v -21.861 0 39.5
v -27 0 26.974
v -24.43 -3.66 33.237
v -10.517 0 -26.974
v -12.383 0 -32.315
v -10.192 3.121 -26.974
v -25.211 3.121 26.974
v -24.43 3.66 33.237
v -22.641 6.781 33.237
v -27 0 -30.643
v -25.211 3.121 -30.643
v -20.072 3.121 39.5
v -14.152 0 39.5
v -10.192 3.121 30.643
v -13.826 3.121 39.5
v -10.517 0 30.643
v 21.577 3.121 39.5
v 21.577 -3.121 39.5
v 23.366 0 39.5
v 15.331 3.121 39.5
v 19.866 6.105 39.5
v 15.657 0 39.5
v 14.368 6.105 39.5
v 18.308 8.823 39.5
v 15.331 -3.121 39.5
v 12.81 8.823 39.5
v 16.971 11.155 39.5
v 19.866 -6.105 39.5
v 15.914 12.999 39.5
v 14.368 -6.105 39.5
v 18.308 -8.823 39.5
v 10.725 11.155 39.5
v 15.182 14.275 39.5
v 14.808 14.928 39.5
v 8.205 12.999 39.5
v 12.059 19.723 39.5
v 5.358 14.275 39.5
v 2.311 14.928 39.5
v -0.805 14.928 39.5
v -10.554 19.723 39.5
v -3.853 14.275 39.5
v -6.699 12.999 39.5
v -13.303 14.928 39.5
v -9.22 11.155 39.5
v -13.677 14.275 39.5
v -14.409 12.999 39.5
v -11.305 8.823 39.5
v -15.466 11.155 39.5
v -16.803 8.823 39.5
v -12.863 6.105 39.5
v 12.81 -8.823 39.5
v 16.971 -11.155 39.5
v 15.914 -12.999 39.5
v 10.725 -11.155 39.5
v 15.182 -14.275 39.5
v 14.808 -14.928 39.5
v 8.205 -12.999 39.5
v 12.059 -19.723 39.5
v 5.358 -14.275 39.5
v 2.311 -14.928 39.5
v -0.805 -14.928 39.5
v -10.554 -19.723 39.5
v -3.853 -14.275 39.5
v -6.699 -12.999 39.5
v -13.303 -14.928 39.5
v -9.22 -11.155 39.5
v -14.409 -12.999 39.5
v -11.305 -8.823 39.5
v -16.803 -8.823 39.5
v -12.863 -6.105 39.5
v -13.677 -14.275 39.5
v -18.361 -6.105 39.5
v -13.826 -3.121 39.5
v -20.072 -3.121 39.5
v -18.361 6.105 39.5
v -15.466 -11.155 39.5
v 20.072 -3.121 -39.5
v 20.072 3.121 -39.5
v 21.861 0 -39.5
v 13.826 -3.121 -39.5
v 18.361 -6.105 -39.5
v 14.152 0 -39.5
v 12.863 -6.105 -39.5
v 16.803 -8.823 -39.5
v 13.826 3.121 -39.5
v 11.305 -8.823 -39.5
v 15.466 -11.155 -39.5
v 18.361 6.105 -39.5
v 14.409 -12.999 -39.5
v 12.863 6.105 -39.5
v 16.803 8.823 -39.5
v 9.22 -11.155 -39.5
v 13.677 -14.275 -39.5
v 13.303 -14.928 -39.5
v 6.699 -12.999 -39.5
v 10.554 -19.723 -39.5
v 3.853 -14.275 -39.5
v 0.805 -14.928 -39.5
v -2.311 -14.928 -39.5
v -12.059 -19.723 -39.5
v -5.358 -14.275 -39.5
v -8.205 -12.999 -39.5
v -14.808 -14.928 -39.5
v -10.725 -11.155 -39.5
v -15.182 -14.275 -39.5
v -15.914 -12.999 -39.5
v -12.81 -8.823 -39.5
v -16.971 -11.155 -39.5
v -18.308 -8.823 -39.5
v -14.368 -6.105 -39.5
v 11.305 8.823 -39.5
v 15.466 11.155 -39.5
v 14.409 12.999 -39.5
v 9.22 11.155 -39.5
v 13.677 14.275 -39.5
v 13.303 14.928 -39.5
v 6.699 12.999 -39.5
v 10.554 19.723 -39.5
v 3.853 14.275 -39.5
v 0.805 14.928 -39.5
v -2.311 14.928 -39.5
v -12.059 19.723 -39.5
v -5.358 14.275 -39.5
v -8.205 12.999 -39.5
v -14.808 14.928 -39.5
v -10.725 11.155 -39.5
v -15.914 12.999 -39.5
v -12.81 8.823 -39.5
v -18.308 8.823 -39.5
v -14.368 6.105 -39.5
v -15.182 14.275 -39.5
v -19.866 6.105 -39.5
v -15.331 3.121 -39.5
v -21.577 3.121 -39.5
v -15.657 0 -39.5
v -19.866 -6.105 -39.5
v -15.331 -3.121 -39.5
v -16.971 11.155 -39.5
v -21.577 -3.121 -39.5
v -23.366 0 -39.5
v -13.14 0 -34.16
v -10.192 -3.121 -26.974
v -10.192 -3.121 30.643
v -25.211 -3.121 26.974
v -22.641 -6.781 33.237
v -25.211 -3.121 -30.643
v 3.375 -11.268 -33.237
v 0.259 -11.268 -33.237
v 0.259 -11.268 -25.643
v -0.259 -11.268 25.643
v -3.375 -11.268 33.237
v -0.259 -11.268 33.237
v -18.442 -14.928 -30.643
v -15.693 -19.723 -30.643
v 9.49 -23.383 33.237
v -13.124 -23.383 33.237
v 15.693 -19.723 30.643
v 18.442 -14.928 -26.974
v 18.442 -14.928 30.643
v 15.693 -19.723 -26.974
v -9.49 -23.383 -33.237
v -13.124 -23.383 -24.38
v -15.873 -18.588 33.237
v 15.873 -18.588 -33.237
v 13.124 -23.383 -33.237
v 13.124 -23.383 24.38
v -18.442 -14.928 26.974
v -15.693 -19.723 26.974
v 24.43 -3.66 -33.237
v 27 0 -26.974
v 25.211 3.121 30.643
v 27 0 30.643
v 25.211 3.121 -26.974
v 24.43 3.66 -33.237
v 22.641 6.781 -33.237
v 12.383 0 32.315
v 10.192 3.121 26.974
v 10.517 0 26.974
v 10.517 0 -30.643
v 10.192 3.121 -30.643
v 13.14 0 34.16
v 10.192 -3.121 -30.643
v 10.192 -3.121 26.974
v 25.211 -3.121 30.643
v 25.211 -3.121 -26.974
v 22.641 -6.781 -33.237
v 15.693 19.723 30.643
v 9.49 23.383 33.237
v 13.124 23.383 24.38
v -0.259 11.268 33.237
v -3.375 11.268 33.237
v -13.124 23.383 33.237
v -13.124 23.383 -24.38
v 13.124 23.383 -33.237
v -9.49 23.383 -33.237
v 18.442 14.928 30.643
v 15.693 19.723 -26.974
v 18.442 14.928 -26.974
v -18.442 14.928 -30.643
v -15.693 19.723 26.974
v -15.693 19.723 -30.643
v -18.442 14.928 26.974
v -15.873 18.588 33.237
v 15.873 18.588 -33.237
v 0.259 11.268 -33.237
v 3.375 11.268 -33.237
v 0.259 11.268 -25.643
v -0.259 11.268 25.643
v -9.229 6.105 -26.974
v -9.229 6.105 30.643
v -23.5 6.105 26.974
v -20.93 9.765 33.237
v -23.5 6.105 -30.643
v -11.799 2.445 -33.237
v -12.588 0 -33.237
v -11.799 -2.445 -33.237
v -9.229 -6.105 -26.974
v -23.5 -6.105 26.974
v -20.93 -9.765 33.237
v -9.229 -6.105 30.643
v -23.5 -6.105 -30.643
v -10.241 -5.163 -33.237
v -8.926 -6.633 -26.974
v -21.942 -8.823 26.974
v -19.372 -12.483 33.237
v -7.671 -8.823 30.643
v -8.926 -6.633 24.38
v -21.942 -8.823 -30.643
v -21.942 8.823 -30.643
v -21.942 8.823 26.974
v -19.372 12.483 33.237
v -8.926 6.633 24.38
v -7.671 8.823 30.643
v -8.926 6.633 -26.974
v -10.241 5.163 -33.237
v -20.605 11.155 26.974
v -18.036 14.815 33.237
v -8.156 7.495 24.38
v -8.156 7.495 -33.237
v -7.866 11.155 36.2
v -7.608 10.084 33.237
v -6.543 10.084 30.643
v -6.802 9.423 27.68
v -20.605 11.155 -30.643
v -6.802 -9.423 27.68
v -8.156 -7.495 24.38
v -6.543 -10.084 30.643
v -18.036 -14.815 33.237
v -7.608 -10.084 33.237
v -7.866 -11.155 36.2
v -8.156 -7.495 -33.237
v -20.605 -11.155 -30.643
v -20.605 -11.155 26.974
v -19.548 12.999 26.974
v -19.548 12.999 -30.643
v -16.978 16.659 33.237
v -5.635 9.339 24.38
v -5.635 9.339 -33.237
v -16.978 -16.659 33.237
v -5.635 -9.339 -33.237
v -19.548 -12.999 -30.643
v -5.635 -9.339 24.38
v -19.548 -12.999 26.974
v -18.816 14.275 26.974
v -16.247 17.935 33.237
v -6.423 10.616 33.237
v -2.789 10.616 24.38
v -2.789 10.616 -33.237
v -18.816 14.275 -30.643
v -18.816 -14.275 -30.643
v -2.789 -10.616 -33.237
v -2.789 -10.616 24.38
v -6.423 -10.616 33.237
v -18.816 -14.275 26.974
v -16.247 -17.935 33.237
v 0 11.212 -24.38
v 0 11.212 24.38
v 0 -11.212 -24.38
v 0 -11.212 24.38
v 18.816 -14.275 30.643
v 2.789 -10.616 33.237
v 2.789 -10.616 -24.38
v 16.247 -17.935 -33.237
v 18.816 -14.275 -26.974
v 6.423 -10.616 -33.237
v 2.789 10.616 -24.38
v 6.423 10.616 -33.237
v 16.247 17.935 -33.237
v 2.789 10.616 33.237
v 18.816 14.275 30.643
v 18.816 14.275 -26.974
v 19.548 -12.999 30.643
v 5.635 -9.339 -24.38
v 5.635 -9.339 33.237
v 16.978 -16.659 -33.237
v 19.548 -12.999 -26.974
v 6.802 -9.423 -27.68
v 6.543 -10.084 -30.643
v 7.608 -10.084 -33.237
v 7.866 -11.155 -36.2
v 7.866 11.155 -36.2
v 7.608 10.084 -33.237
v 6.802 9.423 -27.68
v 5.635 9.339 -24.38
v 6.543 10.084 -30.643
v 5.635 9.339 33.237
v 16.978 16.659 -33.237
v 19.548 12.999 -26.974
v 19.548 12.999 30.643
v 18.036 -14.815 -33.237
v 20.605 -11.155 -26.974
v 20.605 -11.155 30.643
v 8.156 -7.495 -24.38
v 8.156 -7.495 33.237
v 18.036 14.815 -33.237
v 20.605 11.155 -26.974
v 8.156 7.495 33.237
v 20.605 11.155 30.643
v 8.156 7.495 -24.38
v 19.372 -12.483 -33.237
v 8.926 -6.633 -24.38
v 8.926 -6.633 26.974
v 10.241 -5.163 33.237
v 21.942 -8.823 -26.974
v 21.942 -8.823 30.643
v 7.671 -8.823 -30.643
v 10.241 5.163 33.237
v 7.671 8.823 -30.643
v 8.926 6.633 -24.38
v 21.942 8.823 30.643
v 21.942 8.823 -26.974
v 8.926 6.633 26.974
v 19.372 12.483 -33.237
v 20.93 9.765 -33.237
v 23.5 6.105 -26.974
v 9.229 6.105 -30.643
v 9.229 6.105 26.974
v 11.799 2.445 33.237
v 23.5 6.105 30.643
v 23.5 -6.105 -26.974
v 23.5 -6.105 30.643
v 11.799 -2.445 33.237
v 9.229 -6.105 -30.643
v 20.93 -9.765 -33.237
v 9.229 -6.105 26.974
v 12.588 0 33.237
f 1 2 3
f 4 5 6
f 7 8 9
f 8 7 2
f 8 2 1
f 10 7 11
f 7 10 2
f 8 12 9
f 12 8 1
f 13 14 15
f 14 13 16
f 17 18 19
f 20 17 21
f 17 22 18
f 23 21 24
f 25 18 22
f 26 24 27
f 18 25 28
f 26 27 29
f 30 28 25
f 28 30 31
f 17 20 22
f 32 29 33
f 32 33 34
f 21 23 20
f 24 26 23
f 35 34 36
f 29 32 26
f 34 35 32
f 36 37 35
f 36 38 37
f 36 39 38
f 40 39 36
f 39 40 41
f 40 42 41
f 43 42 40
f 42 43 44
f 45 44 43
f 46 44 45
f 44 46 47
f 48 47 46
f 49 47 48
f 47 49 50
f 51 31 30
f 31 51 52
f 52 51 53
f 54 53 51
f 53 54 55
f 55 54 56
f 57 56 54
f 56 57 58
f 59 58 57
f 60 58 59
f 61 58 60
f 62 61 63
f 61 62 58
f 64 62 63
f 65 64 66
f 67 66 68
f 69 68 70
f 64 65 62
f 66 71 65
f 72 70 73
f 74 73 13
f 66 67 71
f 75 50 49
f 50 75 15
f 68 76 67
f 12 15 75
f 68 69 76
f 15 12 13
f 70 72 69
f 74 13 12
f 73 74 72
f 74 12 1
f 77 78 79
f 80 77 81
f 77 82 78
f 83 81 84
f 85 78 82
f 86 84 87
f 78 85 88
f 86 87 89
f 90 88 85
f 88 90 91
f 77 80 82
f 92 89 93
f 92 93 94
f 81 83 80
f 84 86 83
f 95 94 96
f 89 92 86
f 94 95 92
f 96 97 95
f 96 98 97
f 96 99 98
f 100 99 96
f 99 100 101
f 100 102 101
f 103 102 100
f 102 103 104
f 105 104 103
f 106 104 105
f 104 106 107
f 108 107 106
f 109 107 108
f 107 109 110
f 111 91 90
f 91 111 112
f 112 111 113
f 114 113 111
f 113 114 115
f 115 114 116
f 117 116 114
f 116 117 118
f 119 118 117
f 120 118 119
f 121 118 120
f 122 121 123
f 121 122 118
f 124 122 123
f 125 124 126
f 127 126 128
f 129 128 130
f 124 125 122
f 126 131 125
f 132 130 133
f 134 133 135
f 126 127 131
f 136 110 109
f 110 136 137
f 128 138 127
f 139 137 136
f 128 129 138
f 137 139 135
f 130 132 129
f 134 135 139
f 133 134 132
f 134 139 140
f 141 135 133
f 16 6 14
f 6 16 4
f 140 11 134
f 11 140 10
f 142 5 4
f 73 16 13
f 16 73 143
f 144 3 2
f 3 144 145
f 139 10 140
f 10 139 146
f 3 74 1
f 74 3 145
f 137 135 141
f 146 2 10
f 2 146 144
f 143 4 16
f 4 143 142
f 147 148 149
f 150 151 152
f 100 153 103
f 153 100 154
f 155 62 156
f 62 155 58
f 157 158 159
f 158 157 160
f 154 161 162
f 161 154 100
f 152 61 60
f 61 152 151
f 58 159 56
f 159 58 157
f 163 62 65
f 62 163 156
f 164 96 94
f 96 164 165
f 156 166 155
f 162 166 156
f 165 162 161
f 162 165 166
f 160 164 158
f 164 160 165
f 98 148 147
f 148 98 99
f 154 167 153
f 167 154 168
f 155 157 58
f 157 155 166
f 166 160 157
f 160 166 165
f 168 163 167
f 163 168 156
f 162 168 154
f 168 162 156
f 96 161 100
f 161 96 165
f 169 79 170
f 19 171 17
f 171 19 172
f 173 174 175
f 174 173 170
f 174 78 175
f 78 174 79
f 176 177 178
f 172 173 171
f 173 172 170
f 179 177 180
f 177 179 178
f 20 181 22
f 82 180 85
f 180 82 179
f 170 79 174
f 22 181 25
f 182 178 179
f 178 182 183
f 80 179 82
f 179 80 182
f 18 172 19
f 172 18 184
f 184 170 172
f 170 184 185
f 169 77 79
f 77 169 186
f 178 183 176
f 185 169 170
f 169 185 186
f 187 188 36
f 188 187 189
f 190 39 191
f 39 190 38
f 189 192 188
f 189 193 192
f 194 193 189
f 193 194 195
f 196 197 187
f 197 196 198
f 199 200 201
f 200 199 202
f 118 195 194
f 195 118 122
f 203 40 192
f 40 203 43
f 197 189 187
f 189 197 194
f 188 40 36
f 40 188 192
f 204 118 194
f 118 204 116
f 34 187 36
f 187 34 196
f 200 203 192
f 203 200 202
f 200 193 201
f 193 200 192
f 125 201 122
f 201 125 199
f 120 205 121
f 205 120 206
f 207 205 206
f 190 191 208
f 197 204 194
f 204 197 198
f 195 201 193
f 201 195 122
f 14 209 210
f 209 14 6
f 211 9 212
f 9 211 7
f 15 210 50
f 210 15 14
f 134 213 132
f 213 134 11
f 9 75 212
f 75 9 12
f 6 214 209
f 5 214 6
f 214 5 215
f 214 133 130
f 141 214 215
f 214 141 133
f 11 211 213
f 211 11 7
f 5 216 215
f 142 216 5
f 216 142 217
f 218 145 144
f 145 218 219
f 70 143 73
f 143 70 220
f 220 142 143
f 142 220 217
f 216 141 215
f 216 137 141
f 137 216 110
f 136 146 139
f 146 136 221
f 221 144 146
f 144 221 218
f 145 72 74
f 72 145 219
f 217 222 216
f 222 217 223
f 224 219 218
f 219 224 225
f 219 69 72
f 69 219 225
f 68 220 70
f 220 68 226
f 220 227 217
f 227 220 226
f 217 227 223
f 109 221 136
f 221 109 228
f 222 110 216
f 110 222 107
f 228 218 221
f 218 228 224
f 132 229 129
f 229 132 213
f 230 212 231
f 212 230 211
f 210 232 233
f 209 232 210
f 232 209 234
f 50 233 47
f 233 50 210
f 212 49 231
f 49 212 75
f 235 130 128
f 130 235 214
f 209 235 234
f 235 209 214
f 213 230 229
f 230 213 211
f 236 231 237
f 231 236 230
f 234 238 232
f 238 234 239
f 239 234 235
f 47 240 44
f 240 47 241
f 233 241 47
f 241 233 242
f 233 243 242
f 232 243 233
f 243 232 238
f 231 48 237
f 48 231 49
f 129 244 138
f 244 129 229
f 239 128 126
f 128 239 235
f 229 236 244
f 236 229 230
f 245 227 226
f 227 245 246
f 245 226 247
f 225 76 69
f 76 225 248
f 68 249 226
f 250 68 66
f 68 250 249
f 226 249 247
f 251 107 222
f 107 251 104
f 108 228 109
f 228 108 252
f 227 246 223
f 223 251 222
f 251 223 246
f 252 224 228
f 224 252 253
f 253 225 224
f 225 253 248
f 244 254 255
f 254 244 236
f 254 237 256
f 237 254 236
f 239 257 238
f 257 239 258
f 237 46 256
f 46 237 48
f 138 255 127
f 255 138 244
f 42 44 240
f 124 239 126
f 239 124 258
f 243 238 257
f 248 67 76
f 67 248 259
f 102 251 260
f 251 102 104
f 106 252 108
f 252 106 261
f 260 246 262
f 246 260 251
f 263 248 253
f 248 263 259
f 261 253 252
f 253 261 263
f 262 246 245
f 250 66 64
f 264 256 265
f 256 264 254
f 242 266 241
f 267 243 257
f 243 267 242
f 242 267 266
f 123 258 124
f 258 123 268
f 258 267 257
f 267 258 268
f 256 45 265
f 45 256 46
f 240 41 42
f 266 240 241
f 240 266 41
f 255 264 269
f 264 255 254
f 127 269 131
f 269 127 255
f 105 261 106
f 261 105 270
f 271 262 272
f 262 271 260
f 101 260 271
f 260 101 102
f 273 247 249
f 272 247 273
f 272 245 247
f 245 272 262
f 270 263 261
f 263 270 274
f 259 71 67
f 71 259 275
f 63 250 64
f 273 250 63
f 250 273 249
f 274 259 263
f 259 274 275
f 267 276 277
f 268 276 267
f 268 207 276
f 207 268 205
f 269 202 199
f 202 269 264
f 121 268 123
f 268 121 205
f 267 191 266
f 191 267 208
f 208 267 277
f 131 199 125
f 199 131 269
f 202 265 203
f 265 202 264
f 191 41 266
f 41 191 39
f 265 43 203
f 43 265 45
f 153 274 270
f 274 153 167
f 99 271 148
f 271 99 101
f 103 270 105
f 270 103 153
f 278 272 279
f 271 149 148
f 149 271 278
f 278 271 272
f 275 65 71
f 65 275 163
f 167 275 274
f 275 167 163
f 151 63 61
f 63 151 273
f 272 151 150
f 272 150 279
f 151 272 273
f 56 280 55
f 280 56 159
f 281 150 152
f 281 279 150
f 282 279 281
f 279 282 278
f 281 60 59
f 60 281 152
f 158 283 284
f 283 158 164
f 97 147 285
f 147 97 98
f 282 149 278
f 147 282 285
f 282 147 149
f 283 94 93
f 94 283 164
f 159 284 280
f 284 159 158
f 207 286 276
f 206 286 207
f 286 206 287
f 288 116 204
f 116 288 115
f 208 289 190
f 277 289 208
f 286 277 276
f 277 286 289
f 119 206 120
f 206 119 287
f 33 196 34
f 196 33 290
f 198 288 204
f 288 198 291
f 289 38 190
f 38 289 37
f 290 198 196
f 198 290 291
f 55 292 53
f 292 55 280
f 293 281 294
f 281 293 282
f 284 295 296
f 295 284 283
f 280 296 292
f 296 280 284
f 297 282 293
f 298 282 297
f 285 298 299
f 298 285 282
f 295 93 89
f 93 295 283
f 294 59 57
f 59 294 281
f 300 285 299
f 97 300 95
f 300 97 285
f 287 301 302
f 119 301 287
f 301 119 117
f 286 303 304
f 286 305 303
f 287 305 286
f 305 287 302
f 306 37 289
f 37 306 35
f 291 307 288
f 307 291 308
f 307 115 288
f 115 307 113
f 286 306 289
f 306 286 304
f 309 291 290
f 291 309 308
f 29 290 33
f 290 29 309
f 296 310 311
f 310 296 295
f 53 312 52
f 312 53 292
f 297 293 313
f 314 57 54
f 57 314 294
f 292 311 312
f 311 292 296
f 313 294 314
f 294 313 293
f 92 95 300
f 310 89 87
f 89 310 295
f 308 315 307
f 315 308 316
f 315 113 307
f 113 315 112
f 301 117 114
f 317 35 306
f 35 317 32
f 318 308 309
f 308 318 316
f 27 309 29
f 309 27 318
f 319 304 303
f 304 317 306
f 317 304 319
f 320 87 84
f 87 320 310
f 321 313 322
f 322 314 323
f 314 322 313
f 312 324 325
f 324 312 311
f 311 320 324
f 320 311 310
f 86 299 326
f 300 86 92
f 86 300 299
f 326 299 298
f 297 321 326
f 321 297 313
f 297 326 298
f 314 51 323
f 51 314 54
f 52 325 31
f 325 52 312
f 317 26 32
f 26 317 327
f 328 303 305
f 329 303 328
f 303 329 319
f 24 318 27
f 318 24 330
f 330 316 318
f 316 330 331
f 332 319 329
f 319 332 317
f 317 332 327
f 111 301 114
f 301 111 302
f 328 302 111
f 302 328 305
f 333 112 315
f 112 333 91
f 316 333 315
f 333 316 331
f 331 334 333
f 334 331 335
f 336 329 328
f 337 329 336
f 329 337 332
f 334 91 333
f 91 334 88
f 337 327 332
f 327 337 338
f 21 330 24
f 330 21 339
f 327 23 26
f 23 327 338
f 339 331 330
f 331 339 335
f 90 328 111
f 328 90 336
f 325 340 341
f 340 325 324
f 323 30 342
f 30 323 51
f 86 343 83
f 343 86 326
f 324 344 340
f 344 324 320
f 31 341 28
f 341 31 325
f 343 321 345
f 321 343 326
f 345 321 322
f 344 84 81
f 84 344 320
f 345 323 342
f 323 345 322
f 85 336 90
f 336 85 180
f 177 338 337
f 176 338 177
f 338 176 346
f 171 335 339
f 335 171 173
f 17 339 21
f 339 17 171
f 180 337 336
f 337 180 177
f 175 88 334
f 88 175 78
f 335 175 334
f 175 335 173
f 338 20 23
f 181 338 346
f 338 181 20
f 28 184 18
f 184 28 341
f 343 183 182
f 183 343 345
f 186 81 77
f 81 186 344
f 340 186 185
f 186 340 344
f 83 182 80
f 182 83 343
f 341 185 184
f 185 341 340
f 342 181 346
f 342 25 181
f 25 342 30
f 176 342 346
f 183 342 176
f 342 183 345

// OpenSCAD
nut_outer_diameter = 44;
nut_inner_diameter = 19;
nut_height = 23;

layer_margin = 5;
layer_count = 3;
layers = [
  for(i=[0:(layer_count - 1)])
  i * (nut_height + layer_margin)
];

module nut(margin_outer=0, margin_inner=0) {
  r_outer = (nut_outer_diameter / 2) + margin_outer;
  r_inner = (nut_inner_diameter / 2) + margin_inner;
  h = nut_height + margin_outer;

  angles = [for (i=[0:5]) i * (360 / 6)];
  coords = [for (th=angles) [r_outer * cos(th), r_outer * sin(th)]];

  difference() {
    translate([0, 0, -h/2])
    linear_extrude(height=h)
    polygon(coords);

    cylinder(r=r_inner, h=h+1, center=true);
  }
}

module nut_stack(margin=0) {
  shift = nut_outer_diameter / 2;
  angles = [for (i=[0:(layer_count - 1)]) i*(360 / 6)];
  coords = [for (th=angles) [shift * cos(th), shift * sin(th)]];

  for(layer=layers) {
    translate([0, 0, layer])
    nut(margin, -nut_inner_diameter);
  }

  for(i=[0:(layer_count - 1)]) {
    c = coords[i];

    translate([c[0], c[1], layers[i]])
    nut(margin, -nut_inner_diameter);
  }
}

module fillet() {
  rotate([45,45,0])
  cube([layer_margin, layer_margin, layer_margin], center=true);
}

module door_blocker(margin=0) {
  size_x = nut_outer_diameter + 2*layer_margin;
  size_y = size_x * sin(60);
  size_z = nut_height * layer_count + layer_margin * (layer_count - 1);

  resize([size_x, size_y, size_z])
  minkowski() {
    nut(0, layer_margin);

    fillet();
  }
}

door_blocker();
